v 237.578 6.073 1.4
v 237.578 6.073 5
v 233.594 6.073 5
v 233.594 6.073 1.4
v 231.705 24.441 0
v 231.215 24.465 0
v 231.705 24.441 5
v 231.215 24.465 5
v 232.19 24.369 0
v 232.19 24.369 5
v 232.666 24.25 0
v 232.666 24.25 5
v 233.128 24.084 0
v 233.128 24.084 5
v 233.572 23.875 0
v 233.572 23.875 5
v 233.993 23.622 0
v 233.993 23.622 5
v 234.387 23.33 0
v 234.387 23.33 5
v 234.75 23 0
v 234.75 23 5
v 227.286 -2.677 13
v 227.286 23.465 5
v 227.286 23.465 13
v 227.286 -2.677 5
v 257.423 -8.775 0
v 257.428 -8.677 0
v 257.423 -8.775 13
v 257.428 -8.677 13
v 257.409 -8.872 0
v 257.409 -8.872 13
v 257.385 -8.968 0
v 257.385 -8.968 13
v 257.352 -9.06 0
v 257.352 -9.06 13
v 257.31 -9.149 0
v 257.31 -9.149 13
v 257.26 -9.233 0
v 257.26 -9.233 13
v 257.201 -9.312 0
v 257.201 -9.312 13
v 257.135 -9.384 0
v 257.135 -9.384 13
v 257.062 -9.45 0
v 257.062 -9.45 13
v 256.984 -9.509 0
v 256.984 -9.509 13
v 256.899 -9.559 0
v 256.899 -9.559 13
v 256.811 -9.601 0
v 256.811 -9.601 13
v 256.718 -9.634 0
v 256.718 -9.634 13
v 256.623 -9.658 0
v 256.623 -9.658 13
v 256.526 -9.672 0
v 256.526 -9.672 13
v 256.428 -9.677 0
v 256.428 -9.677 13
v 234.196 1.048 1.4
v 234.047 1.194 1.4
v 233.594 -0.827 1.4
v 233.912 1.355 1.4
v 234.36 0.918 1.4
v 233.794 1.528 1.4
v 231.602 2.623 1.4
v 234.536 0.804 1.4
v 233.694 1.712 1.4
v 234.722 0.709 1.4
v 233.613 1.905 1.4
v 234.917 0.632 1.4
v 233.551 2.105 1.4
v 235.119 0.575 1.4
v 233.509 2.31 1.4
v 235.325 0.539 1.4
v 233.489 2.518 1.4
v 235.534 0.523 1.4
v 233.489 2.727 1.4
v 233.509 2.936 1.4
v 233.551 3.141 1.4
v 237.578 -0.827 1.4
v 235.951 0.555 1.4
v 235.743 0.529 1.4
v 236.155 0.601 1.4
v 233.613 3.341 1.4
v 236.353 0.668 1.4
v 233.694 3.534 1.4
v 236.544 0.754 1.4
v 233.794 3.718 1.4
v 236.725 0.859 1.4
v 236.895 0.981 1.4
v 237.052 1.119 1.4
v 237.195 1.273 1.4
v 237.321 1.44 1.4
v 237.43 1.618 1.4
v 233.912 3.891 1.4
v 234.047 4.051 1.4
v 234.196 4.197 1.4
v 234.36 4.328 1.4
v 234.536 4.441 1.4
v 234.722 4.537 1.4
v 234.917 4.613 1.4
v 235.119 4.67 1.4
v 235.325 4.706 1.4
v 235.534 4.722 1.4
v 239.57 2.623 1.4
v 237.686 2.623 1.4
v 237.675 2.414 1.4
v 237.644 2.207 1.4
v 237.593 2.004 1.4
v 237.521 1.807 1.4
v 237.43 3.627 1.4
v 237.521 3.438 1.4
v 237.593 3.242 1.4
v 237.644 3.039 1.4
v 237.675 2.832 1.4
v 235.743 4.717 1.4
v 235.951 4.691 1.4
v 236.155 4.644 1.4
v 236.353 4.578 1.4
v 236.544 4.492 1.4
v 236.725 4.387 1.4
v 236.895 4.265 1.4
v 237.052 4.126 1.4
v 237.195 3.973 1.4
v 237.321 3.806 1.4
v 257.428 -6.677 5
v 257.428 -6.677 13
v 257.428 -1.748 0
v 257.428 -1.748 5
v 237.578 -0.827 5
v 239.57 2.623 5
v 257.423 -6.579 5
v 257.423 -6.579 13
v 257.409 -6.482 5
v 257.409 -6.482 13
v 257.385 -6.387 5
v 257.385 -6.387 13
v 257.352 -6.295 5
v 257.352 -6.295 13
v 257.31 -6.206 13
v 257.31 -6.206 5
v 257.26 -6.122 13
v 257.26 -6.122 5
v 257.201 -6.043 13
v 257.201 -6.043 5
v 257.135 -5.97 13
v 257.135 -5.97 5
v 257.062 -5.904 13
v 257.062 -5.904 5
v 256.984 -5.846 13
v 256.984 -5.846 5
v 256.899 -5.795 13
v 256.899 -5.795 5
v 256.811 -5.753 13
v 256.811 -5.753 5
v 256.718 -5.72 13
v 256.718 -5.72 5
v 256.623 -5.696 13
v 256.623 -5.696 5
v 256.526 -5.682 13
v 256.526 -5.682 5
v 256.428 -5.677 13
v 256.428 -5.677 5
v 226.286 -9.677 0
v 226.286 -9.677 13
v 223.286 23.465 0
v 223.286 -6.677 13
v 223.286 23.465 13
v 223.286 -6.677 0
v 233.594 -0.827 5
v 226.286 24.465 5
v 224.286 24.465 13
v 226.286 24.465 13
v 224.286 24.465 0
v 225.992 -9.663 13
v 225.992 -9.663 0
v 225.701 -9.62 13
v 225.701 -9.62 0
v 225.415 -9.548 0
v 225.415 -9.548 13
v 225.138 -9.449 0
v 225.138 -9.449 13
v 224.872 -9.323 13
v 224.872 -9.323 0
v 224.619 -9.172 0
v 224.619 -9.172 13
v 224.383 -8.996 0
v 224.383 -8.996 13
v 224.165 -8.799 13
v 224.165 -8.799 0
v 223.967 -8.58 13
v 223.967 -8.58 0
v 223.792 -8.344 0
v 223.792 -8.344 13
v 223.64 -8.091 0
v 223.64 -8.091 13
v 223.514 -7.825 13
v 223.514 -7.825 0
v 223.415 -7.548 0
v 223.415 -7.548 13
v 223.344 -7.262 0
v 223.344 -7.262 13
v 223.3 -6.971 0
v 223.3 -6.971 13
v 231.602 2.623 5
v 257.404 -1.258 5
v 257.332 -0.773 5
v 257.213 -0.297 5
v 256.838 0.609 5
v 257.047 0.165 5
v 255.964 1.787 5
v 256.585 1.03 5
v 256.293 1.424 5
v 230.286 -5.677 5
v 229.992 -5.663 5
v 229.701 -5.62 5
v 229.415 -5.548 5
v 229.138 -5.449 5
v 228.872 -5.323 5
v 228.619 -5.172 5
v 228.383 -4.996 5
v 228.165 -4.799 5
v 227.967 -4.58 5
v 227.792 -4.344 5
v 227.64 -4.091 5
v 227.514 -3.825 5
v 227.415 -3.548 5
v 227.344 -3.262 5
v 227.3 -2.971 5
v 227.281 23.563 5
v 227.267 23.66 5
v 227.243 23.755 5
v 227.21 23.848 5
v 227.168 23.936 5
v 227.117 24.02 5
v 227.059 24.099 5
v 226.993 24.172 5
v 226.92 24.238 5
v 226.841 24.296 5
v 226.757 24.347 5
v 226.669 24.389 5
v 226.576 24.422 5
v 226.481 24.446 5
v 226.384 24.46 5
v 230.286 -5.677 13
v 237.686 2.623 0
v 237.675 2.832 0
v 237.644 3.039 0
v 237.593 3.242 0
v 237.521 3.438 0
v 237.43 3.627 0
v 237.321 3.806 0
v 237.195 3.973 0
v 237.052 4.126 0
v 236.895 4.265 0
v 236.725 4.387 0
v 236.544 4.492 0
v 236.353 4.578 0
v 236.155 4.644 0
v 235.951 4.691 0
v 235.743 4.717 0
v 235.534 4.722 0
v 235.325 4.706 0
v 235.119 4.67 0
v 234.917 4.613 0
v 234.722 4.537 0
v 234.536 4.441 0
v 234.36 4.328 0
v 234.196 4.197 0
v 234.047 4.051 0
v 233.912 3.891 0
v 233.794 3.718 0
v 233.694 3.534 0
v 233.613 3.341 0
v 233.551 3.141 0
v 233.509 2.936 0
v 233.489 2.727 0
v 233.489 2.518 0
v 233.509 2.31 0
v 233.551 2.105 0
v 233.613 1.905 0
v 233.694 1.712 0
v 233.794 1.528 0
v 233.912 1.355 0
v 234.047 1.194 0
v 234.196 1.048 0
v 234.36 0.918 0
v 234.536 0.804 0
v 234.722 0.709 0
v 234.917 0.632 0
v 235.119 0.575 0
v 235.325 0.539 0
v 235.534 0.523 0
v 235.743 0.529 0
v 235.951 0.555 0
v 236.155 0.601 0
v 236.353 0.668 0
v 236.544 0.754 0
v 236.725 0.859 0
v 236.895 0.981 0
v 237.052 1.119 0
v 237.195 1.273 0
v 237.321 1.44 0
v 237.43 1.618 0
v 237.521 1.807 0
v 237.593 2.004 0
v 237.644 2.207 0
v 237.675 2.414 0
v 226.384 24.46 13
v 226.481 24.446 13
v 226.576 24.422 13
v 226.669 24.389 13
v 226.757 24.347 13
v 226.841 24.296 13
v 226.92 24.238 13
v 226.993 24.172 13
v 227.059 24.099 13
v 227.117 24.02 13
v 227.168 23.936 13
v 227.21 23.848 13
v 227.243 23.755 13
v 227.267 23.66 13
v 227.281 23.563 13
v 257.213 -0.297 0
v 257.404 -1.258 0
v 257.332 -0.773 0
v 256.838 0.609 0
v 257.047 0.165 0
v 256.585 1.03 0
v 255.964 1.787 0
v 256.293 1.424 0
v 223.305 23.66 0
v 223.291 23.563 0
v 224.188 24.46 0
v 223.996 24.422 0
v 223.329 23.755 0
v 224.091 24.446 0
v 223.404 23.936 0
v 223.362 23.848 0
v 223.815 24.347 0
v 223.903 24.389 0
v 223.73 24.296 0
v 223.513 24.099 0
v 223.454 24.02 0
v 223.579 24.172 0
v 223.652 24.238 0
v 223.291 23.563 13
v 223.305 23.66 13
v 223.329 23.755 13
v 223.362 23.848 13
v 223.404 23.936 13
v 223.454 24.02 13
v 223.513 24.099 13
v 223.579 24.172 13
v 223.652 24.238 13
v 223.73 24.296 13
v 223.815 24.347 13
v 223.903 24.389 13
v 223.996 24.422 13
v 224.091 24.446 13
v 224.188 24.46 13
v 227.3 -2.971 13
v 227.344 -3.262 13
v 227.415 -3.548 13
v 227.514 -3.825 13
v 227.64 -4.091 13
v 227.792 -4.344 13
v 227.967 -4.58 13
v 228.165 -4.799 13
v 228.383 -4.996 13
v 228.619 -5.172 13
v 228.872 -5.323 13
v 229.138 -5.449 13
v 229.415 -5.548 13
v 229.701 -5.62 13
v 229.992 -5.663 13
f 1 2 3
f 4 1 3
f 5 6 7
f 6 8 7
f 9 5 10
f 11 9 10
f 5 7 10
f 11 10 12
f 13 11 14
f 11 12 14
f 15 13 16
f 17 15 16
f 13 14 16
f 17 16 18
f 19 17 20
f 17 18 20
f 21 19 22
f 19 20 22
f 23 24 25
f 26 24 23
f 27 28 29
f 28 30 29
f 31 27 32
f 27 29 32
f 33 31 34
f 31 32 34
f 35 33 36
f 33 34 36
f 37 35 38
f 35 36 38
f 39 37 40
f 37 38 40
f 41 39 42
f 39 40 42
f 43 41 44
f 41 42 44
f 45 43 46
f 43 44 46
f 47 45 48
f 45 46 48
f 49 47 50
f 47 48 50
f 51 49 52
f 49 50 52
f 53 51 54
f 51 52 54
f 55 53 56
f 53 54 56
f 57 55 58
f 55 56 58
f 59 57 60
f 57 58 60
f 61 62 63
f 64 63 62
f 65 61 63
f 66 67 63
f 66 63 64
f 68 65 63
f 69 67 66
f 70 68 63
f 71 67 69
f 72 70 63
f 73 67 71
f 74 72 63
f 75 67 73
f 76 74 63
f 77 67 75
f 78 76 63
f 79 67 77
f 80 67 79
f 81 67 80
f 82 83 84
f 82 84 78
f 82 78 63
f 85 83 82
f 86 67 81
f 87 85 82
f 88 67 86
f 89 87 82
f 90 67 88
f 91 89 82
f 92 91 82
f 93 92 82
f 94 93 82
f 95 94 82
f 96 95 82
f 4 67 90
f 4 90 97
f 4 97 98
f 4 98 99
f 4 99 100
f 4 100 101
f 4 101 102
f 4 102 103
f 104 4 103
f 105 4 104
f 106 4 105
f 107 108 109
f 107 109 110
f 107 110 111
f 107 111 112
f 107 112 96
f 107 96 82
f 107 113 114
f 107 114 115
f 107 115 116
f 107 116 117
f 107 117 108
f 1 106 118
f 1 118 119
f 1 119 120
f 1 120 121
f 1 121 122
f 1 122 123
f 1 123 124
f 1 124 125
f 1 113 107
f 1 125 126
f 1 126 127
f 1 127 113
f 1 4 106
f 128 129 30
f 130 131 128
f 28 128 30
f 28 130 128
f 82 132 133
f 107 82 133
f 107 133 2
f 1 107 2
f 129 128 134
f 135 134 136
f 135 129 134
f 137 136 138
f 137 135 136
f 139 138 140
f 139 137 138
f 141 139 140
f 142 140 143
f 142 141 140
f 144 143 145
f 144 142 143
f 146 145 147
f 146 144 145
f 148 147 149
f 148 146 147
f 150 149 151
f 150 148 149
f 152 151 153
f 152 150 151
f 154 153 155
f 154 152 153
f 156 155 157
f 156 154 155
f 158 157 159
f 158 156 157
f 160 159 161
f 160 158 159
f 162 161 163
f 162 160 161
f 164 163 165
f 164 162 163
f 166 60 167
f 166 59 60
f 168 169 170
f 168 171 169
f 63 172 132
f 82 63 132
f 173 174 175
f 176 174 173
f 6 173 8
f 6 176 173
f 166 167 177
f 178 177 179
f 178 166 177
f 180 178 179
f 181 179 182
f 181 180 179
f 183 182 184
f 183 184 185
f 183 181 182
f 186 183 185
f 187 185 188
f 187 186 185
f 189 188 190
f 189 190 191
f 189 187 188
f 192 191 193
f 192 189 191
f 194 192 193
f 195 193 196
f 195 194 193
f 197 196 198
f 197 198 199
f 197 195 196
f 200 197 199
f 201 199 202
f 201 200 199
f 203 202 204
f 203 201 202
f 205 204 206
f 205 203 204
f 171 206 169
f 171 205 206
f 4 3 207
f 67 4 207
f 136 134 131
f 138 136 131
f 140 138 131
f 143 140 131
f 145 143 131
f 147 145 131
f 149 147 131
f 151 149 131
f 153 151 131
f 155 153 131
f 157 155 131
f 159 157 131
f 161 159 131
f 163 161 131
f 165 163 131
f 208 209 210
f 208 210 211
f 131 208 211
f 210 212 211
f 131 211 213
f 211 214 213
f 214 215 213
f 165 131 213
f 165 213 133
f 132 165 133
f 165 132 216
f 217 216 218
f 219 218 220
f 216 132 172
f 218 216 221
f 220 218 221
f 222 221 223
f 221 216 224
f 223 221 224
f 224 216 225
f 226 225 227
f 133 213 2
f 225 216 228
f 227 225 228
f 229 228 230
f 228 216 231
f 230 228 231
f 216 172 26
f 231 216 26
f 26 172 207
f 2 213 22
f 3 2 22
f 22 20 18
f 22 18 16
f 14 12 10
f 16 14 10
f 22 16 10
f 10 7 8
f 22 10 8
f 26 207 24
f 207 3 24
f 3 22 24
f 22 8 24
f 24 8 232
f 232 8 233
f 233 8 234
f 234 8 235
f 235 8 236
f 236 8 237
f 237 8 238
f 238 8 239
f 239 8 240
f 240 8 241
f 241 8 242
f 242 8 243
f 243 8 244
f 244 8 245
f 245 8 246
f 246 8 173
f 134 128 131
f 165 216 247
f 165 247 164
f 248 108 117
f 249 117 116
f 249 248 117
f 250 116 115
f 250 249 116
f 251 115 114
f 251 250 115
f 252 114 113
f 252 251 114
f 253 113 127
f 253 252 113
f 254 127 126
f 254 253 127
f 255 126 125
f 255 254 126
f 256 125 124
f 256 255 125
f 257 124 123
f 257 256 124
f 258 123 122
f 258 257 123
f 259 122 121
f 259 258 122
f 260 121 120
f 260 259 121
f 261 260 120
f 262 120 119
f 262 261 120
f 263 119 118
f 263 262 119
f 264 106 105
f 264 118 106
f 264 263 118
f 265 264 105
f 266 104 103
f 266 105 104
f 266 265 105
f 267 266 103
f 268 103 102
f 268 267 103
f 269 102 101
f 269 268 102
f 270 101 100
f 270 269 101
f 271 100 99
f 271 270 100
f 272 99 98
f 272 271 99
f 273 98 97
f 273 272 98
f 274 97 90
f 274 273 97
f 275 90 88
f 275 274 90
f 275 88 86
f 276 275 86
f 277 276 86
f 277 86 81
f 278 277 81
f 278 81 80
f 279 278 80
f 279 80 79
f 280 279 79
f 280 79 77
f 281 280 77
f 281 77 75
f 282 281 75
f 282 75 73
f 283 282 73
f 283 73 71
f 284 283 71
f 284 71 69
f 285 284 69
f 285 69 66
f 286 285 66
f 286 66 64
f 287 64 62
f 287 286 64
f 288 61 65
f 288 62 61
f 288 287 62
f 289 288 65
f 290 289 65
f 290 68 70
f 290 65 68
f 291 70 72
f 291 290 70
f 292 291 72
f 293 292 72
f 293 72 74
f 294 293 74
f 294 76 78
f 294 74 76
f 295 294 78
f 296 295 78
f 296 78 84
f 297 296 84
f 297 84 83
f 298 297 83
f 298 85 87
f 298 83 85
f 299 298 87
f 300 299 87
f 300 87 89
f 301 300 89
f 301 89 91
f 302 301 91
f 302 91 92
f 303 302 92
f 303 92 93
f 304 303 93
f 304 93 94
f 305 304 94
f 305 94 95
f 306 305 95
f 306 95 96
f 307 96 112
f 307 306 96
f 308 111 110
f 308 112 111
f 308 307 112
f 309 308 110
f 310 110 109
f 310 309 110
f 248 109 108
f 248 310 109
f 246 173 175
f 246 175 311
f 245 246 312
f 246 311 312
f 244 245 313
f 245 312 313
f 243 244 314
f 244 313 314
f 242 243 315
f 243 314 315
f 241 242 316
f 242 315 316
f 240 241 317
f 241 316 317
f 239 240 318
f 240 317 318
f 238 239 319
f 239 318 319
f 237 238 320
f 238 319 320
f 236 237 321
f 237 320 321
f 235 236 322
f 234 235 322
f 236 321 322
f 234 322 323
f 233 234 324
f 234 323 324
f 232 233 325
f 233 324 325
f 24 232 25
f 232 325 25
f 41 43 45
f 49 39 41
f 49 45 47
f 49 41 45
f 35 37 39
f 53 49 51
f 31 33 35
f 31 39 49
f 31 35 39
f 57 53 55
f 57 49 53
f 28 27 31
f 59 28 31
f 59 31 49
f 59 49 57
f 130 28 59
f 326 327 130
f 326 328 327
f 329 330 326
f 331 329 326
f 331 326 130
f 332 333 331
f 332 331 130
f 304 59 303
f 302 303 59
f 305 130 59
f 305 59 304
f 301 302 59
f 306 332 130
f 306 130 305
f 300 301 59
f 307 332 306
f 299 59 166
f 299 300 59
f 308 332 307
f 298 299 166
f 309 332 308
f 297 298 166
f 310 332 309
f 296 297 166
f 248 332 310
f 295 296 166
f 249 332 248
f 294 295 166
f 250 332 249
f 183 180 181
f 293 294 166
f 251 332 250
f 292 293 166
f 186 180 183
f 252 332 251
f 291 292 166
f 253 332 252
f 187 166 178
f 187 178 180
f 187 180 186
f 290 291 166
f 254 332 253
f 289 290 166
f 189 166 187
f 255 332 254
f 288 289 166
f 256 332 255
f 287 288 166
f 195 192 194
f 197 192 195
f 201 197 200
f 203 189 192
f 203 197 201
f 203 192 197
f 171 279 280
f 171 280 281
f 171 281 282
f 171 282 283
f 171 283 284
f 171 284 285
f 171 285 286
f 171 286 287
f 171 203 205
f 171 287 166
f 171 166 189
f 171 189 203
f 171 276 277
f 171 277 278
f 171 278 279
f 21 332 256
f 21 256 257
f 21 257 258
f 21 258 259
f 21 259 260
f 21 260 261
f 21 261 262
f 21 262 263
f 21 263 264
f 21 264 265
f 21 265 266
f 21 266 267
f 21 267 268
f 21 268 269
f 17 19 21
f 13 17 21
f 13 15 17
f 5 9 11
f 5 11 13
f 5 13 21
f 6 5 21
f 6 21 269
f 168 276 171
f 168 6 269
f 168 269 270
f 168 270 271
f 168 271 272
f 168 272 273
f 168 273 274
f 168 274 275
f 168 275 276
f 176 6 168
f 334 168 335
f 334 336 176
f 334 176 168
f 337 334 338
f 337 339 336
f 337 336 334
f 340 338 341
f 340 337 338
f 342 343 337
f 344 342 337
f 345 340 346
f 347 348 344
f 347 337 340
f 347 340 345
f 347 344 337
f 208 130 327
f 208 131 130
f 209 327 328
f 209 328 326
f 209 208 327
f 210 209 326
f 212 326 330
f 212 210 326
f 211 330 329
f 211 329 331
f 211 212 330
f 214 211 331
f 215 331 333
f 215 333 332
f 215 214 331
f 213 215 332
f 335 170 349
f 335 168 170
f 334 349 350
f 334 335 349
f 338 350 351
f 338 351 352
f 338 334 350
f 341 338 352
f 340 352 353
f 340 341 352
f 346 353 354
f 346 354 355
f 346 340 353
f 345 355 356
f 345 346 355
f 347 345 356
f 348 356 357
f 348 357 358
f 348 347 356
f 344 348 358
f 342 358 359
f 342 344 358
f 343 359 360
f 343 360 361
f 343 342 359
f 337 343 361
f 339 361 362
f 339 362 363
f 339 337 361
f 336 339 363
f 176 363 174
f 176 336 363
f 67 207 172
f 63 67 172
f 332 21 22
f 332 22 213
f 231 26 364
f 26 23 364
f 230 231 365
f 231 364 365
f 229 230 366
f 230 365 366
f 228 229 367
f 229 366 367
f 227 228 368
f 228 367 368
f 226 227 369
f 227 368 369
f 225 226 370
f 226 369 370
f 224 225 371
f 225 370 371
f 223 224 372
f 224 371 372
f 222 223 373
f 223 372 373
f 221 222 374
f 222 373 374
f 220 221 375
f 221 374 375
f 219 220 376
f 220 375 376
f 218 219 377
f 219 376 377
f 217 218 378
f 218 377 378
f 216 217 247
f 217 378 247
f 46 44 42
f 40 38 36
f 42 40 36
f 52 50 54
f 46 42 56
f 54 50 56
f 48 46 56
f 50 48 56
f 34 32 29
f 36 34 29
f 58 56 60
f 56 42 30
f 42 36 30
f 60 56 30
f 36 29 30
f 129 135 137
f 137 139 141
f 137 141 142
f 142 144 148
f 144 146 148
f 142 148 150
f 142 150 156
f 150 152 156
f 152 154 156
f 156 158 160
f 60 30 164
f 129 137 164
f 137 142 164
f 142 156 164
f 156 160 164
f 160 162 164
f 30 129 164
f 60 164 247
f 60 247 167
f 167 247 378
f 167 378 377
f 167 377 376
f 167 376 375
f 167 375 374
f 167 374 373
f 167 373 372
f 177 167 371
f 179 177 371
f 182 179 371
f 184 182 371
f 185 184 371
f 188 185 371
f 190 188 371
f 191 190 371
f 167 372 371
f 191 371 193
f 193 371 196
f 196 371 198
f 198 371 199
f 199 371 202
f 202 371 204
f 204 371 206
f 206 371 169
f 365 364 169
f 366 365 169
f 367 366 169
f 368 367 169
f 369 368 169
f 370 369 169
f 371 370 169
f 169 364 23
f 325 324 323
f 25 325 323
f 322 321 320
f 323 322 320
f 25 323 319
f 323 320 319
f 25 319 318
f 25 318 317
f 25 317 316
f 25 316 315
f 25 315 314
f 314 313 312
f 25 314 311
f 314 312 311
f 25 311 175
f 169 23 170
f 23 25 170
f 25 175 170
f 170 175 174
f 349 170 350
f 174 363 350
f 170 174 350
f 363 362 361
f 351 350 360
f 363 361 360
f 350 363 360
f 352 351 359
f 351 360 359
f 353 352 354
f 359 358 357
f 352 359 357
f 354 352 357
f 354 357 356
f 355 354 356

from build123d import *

# Parameters (mm, degrees)
SKETCH1_R           = 2.1
BOSS_EXTRUDE1_DEPTH = 5
BOSS_EXTRUDE2_DEPTH = 8
FILLET1_R           = 3
CUT_EXTRUDE1_DEPTH  = 3.6
FILLET2_R           = 5
FILLET3_R           = 1


with BuildPart() as part:
    # Sketch1 → Boss-Extrude1 (new body)
    with BuildSketch(Plane.XY):
        Polygon((257.428056395, -9.677220034), (223.285920771, -9.677220034), (223.285920771, 24.46491559), (233.285920771, 24.46491559), (257.428056395, 0.322779966), align=None)
        with Locations((235.585920771, 2.622779966)):
            Circle(SKETCH1_R, mode=Mode.SUBTRACT)
    extrude(amount=BOSS_EXTRUDE1_DEPTH)

    # Sketch2 → Boss-Extrude2 (add)
    with BuildSketch(Plane.XY.offset(5)):
        Polygon((257.428056395, -9.677220034), (223.285920771, -9.677220034), (223.285920771, 24.46491559), (227.285920771, 24.46491559), (227.285920771, -5.677220034), (257.428056395, -5.677220034), align=None)
    extrude(amount=BOSS_EXTRUDE2_DEPTH)

    # Fillet1
    fillet1_edges = [part.edges().sort_by_distance(p)[0] for p in [
        (227.285920771, -5.677220034, 9),
        (223.285920771, -9.677220034, 6.5),
    ]]
    fillet(fillet1_edges, radius=FILLET1_R)

    # Sketch3 → Cut-Extrude1 (cut)
    with BuildSketch(Plane.XY.offset(5)):
        Polygon((239.569637629, 2.622779966), (237.5777792, 6.072779966), (233.594062342, 6.072779966), (231.602203914, 2.622779966), (233.594062342, -0.827220034), (237.5777792, -0.827220034), align=None)
    extrude(amount=-CUT_EXTRUDE1_DEPTH, mode=Mode.SUBTRACT)

    # Fillet2
    fillet2_edges = [part.edges().sort_by_distance(p)[0] for p in [
        (233.285920771, 24.46491559, 2.5),
        (257.428056395, 0.322779966, 2.5),
    ]]
    fillet(fillet2_edges, radius=FILLET2_R)

    # Fillet3
    fillet3_edges = [part.edges().sort_by_distance(p)[0] for p in [
        (257.428056395, -5.677220034, 9),
        (227.285920771, 24.46491559, 9),
        (257.428056395, -9.677220034, 6.5),
        (223.285920771, 24.46491559, 6.5),
    ]]
    fillet(fillet3_edges, radius=FILLET3_R)


solid = part.part
